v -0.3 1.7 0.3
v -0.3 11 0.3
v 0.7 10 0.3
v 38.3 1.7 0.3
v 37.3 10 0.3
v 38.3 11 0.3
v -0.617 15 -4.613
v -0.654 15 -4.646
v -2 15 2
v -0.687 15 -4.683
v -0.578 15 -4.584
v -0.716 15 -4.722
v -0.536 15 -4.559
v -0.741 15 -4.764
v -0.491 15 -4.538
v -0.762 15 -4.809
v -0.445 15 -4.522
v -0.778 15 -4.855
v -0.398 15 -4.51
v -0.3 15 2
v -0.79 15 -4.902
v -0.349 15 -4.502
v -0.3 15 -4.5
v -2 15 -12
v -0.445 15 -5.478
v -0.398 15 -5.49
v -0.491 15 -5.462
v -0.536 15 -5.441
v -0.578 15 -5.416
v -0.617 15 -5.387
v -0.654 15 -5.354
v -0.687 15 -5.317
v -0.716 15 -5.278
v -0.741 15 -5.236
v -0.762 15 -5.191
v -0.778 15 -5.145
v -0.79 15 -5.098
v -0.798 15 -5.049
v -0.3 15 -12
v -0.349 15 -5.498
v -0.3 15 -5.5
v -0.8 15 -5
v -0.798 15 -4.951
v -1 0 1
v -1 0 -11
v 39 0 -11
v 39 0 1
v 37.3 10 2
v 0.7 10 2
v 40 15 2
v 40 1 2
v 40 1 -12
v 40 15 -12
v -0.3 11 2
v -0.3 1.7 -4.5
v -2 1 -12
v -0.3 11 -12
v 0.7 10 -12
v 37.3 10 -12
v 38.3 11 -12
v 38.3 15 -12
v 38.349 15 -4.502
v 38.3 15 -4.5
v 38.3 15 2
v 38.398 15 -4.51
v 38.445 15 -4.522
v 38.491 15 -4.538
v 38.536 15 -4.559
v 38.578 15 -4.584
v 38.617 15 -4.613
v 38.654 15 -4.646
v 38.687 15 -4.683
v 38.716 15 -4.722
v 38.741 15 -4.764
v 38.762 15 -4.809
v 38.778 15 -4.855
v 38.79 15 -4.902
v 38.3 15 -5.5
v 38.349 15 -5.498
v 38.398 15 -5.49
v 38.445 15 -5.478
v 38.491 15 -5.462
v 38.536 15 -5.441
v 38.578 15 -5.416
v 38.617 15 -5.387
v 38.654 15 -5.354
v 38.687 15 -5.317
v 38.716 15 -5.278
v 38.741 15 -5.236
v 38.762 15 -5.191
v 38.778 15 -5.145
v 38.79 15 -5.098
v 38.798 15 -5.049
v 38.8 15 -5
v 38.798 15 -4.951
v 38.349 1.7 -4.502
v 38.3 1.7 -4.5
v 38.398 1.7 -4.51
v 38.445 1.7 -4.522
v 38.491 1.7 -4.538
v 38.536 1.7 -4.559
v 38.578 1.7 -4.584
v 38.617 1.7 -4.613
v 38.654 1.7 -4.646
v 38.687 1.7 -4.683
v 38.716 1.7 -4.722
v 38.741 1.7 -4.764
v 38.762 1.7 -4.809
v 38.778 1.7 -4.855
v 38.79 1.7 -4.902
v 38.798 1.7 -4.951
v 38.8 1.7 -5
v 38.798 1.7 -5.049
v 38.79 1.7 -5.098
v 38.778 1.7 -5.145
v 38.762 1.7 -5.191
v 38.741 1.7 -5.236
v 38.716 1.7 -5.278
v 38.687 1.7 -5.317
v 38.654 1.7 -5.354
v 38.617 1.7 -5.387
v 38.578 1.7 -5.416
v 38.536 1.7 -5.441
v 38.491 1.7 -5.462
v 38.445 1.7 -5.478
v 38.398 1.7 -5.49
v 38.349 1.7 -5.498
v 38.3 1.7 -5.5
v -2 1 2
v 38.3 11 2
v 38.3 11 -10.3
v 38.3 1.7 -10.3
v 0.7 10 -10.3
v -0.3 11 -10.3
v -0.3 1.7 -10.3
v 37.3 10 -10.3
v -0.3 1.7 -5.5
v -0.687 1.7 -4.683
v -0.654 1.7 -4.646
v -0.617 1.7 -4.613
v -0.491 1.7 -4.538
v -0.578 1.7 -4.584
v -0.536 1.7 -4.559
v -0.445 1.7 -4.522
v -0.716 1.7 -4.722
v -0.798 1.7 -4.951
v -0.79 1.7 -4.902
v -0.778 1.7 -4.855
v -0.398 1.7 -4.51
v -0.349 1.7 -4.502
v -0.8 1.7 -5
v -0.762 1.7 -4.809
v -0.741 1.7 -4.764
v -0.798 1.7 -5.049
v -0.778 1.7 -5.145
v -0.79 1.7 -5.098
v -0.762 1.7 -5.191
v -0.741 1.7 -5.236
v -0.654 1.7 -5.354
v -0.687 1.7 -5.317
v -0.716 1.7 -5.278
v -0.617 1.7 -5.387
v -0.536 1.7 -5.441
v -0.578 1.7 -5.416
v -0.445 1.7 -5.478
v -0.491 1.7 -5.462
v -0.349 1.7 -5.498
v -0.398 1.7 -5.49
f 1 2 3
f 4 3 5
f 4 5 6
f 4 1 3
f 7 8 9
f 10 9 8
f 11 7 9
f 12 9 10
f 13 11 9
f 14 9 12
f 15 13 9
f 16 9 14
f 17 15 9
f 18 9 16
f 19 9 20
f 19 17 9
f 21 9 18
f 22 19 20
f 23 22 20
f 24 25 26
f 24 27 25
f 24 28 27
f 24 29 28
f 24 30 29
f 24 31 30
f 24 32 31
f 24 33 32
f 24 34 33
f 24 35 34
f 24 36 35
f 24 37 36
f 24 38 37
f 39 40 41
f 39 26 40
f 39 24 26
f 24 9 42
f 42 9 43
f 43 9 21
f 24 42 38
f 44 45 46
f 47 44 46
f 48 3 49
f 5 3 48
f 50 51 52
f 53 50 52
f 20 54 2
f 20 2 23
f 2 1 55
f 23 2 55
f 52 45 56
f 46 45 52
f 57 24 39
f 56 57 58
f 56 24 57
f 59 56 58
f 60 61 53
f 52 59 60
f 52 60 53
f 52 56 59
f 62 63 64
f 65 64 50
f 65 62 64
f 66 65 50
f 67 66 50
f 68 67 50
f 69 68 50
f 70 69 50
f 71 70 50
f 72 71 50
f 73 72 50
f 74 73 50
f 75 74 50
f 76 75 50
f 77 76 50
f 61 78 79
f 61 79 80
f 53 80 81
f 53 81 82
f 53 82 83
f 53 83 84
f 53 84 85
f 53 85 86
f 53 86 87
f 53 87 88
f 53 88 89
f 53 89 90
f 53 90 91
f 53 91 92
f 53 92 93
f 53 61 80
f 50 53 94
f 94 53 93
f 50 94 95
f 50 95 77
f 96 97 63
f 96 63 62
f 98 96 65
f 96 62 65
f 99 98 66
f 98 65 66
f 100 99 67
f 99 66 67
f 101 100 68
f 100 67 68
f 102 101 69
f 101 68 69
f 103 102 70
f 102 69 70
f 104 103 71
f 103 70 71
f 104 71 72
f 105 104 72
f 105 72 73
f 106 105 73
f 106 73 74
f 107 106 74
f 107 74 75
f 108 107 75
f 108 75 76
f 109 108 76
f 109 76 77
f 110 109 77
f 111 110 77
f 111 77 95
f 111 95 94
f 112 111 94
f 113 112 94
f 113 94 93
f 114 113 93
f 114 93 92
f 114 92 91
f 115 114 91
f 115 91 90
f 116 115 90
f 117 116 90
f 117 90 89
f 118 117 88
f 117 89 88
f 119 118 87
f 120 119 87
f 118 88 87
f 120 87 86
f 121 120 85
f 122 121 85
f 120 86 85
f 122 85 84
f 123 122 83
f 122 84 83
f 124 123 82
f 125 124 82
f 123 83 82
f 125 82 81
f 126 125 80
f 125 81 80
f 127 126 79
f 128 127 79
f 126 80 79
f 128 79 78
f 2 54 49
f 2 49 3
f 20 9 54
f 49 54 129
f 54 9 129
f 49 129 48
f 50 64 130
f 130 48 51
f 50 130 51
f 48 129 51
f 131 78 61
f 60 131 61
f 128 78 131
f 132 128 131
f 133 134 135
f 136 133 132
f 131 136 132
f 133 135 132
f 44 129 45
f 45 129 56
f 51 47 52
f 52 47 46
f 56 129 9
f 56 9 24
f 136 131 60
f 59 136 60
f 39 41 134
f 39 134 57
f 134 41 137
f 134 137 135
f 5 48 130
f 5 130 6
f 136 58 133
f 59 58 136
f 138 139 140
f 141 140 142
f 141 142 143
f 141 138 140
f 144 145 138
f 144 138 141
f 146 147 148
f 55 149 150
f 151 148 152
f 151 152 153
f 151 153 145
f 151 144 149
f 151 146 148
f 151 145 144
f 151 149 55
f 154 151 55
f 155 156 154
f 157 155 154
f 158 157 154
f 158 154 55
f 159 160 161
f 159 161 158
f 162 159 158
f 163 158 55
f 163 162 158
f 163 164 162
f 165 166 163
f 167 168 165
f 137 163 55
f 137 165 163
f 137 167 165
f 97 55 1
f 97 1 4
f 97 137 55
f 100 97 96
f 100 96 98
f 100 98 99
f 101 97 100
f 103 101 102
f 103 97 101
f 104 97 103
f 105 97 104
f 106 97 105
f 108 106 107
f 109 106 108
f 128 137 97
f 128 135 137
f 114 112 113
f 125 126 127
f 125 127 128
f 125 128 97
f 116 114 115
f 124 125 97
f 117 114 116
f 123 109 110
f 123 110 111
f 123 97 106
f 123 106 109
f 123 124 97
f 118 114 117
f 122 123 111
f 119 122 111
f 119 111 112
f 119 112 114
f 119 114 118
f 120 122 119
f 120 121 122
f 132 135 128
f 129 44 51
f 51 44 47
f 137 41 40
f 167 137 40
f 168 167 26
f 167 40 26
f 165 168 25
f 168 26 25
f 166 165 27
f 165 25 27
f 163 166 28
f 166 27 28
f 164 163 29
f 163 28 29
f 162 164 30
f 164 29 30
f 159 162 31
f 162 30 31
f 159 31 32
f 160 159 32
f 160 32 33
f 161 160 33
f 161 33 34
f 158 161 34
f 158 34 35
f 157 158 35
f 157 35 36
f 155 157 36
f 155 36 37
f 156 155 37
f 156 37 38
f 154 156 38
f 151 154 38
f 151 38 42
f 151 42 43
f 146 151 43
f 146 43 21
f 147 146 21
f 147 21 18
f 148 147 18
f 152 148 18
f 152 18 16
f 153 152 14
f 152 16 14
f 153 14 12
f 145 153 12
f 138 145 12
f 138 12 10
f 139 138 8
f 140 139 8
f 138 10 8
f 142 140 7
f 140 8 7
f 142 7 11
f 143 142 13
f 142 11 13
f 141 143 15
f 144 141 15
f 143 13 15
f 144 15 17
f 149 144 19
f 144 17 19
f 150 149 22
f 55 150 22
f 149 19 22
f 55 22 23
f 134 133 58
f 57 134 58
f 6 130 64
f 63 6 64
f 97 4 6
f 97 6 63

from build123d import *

# Parameters (mm, degrees)
SKETCH1_W           = 42
SKETCH1_H           = 14
BOSS_EXTRUDE1_DEPTH = 10
SHELL1_T            = -1.7
SKETCH2_W           = 1.7
SKETCH2_H           = 14
BOSS_EXTRUDE2_DEPTH = 5
SKETCH3_R           = 0.5
CUT_EXTRUDE1_DEPTH  = 13.3
CHAMFER1_SIZE       = 1
CHAMFER2_SIZE       = 1


with BuildPart() as part:
    # Sketch1 → Boss-Extrude1 (new body)
    with BuildSketch(Plane(origin=(0, 0, 0), x_dir=(1, 0, 0), z_dir=(0, 1, 0))):
        with Locations((19, 5)):
            Rectangle(SKETCH1_W, SKETCH1_H)
    extrude(amount=BOSS_EXTRUDE1_DEPTH)

    # Shell1
    shell1_openings = [part.faces().sort_by_distance(p)[0] for p in [
        (19, 10, -5),
    ]]
    offset(amount=SHELL1_T, openings=shell1_openings, kind=Kind.INTERSECTION)

    # Sketch2 → Boss-Extrude2 (add)
    with BuildSketch(Plane(origin=(0, 10, 0), x_dir=(1, 0, 0), z_dir=(0, 1, 0))):
        with Locations((-1.15, 5)):
            Rectangle(SKETCH2_W, SKETCH2_H)
        with Locations((39.15, 5)):
            Rectangle(SKETCH2_W, SKETCH2_H)
    extrude(amount=BOSS_EXTRUDE2_DEPTH)

    # Sketch3 → Cut-Extrude1 (cut)
    with BuildSketch(Plane(origin=(0, 15, 0), x_dir=(1, 0, 0), z_dir=(0, 1, 0))):
        with Locations((-0.3, 5)):
            Circle(SKETCH3_R)
        with Locations((38.3, 5)):
            Circle(SKETCH3_R)
    extrude(amount=-CUT_EXTRUDE1_DEPTH, mode=Mode.SUBTRACT)

    # Chamfer1
    chamfer1_edges = [part.edges().sort_by_distance(p)[0] for p in [
        (-0.3, 10, -11.15),
        (-0.3, 10, 1.15),
        (38.3, 10, -11.15),
        (38.3, 10, 1.15),
    ]]
    chamfer(chamfer1_edges, length=CHAMFER1_SIZE)

    # Chamfer2
    chamfer2_edges = [part.edges().sort_by_distance(p)[0] for p in [
        (19, 0, -12),
        (40, 0, -5),
        (19, 0, 2),
        (-2, 0, -5),
    ]]
    chamfer(chamfer2_edges, length=CHAMFER2_SIZE)


solid = part.part
